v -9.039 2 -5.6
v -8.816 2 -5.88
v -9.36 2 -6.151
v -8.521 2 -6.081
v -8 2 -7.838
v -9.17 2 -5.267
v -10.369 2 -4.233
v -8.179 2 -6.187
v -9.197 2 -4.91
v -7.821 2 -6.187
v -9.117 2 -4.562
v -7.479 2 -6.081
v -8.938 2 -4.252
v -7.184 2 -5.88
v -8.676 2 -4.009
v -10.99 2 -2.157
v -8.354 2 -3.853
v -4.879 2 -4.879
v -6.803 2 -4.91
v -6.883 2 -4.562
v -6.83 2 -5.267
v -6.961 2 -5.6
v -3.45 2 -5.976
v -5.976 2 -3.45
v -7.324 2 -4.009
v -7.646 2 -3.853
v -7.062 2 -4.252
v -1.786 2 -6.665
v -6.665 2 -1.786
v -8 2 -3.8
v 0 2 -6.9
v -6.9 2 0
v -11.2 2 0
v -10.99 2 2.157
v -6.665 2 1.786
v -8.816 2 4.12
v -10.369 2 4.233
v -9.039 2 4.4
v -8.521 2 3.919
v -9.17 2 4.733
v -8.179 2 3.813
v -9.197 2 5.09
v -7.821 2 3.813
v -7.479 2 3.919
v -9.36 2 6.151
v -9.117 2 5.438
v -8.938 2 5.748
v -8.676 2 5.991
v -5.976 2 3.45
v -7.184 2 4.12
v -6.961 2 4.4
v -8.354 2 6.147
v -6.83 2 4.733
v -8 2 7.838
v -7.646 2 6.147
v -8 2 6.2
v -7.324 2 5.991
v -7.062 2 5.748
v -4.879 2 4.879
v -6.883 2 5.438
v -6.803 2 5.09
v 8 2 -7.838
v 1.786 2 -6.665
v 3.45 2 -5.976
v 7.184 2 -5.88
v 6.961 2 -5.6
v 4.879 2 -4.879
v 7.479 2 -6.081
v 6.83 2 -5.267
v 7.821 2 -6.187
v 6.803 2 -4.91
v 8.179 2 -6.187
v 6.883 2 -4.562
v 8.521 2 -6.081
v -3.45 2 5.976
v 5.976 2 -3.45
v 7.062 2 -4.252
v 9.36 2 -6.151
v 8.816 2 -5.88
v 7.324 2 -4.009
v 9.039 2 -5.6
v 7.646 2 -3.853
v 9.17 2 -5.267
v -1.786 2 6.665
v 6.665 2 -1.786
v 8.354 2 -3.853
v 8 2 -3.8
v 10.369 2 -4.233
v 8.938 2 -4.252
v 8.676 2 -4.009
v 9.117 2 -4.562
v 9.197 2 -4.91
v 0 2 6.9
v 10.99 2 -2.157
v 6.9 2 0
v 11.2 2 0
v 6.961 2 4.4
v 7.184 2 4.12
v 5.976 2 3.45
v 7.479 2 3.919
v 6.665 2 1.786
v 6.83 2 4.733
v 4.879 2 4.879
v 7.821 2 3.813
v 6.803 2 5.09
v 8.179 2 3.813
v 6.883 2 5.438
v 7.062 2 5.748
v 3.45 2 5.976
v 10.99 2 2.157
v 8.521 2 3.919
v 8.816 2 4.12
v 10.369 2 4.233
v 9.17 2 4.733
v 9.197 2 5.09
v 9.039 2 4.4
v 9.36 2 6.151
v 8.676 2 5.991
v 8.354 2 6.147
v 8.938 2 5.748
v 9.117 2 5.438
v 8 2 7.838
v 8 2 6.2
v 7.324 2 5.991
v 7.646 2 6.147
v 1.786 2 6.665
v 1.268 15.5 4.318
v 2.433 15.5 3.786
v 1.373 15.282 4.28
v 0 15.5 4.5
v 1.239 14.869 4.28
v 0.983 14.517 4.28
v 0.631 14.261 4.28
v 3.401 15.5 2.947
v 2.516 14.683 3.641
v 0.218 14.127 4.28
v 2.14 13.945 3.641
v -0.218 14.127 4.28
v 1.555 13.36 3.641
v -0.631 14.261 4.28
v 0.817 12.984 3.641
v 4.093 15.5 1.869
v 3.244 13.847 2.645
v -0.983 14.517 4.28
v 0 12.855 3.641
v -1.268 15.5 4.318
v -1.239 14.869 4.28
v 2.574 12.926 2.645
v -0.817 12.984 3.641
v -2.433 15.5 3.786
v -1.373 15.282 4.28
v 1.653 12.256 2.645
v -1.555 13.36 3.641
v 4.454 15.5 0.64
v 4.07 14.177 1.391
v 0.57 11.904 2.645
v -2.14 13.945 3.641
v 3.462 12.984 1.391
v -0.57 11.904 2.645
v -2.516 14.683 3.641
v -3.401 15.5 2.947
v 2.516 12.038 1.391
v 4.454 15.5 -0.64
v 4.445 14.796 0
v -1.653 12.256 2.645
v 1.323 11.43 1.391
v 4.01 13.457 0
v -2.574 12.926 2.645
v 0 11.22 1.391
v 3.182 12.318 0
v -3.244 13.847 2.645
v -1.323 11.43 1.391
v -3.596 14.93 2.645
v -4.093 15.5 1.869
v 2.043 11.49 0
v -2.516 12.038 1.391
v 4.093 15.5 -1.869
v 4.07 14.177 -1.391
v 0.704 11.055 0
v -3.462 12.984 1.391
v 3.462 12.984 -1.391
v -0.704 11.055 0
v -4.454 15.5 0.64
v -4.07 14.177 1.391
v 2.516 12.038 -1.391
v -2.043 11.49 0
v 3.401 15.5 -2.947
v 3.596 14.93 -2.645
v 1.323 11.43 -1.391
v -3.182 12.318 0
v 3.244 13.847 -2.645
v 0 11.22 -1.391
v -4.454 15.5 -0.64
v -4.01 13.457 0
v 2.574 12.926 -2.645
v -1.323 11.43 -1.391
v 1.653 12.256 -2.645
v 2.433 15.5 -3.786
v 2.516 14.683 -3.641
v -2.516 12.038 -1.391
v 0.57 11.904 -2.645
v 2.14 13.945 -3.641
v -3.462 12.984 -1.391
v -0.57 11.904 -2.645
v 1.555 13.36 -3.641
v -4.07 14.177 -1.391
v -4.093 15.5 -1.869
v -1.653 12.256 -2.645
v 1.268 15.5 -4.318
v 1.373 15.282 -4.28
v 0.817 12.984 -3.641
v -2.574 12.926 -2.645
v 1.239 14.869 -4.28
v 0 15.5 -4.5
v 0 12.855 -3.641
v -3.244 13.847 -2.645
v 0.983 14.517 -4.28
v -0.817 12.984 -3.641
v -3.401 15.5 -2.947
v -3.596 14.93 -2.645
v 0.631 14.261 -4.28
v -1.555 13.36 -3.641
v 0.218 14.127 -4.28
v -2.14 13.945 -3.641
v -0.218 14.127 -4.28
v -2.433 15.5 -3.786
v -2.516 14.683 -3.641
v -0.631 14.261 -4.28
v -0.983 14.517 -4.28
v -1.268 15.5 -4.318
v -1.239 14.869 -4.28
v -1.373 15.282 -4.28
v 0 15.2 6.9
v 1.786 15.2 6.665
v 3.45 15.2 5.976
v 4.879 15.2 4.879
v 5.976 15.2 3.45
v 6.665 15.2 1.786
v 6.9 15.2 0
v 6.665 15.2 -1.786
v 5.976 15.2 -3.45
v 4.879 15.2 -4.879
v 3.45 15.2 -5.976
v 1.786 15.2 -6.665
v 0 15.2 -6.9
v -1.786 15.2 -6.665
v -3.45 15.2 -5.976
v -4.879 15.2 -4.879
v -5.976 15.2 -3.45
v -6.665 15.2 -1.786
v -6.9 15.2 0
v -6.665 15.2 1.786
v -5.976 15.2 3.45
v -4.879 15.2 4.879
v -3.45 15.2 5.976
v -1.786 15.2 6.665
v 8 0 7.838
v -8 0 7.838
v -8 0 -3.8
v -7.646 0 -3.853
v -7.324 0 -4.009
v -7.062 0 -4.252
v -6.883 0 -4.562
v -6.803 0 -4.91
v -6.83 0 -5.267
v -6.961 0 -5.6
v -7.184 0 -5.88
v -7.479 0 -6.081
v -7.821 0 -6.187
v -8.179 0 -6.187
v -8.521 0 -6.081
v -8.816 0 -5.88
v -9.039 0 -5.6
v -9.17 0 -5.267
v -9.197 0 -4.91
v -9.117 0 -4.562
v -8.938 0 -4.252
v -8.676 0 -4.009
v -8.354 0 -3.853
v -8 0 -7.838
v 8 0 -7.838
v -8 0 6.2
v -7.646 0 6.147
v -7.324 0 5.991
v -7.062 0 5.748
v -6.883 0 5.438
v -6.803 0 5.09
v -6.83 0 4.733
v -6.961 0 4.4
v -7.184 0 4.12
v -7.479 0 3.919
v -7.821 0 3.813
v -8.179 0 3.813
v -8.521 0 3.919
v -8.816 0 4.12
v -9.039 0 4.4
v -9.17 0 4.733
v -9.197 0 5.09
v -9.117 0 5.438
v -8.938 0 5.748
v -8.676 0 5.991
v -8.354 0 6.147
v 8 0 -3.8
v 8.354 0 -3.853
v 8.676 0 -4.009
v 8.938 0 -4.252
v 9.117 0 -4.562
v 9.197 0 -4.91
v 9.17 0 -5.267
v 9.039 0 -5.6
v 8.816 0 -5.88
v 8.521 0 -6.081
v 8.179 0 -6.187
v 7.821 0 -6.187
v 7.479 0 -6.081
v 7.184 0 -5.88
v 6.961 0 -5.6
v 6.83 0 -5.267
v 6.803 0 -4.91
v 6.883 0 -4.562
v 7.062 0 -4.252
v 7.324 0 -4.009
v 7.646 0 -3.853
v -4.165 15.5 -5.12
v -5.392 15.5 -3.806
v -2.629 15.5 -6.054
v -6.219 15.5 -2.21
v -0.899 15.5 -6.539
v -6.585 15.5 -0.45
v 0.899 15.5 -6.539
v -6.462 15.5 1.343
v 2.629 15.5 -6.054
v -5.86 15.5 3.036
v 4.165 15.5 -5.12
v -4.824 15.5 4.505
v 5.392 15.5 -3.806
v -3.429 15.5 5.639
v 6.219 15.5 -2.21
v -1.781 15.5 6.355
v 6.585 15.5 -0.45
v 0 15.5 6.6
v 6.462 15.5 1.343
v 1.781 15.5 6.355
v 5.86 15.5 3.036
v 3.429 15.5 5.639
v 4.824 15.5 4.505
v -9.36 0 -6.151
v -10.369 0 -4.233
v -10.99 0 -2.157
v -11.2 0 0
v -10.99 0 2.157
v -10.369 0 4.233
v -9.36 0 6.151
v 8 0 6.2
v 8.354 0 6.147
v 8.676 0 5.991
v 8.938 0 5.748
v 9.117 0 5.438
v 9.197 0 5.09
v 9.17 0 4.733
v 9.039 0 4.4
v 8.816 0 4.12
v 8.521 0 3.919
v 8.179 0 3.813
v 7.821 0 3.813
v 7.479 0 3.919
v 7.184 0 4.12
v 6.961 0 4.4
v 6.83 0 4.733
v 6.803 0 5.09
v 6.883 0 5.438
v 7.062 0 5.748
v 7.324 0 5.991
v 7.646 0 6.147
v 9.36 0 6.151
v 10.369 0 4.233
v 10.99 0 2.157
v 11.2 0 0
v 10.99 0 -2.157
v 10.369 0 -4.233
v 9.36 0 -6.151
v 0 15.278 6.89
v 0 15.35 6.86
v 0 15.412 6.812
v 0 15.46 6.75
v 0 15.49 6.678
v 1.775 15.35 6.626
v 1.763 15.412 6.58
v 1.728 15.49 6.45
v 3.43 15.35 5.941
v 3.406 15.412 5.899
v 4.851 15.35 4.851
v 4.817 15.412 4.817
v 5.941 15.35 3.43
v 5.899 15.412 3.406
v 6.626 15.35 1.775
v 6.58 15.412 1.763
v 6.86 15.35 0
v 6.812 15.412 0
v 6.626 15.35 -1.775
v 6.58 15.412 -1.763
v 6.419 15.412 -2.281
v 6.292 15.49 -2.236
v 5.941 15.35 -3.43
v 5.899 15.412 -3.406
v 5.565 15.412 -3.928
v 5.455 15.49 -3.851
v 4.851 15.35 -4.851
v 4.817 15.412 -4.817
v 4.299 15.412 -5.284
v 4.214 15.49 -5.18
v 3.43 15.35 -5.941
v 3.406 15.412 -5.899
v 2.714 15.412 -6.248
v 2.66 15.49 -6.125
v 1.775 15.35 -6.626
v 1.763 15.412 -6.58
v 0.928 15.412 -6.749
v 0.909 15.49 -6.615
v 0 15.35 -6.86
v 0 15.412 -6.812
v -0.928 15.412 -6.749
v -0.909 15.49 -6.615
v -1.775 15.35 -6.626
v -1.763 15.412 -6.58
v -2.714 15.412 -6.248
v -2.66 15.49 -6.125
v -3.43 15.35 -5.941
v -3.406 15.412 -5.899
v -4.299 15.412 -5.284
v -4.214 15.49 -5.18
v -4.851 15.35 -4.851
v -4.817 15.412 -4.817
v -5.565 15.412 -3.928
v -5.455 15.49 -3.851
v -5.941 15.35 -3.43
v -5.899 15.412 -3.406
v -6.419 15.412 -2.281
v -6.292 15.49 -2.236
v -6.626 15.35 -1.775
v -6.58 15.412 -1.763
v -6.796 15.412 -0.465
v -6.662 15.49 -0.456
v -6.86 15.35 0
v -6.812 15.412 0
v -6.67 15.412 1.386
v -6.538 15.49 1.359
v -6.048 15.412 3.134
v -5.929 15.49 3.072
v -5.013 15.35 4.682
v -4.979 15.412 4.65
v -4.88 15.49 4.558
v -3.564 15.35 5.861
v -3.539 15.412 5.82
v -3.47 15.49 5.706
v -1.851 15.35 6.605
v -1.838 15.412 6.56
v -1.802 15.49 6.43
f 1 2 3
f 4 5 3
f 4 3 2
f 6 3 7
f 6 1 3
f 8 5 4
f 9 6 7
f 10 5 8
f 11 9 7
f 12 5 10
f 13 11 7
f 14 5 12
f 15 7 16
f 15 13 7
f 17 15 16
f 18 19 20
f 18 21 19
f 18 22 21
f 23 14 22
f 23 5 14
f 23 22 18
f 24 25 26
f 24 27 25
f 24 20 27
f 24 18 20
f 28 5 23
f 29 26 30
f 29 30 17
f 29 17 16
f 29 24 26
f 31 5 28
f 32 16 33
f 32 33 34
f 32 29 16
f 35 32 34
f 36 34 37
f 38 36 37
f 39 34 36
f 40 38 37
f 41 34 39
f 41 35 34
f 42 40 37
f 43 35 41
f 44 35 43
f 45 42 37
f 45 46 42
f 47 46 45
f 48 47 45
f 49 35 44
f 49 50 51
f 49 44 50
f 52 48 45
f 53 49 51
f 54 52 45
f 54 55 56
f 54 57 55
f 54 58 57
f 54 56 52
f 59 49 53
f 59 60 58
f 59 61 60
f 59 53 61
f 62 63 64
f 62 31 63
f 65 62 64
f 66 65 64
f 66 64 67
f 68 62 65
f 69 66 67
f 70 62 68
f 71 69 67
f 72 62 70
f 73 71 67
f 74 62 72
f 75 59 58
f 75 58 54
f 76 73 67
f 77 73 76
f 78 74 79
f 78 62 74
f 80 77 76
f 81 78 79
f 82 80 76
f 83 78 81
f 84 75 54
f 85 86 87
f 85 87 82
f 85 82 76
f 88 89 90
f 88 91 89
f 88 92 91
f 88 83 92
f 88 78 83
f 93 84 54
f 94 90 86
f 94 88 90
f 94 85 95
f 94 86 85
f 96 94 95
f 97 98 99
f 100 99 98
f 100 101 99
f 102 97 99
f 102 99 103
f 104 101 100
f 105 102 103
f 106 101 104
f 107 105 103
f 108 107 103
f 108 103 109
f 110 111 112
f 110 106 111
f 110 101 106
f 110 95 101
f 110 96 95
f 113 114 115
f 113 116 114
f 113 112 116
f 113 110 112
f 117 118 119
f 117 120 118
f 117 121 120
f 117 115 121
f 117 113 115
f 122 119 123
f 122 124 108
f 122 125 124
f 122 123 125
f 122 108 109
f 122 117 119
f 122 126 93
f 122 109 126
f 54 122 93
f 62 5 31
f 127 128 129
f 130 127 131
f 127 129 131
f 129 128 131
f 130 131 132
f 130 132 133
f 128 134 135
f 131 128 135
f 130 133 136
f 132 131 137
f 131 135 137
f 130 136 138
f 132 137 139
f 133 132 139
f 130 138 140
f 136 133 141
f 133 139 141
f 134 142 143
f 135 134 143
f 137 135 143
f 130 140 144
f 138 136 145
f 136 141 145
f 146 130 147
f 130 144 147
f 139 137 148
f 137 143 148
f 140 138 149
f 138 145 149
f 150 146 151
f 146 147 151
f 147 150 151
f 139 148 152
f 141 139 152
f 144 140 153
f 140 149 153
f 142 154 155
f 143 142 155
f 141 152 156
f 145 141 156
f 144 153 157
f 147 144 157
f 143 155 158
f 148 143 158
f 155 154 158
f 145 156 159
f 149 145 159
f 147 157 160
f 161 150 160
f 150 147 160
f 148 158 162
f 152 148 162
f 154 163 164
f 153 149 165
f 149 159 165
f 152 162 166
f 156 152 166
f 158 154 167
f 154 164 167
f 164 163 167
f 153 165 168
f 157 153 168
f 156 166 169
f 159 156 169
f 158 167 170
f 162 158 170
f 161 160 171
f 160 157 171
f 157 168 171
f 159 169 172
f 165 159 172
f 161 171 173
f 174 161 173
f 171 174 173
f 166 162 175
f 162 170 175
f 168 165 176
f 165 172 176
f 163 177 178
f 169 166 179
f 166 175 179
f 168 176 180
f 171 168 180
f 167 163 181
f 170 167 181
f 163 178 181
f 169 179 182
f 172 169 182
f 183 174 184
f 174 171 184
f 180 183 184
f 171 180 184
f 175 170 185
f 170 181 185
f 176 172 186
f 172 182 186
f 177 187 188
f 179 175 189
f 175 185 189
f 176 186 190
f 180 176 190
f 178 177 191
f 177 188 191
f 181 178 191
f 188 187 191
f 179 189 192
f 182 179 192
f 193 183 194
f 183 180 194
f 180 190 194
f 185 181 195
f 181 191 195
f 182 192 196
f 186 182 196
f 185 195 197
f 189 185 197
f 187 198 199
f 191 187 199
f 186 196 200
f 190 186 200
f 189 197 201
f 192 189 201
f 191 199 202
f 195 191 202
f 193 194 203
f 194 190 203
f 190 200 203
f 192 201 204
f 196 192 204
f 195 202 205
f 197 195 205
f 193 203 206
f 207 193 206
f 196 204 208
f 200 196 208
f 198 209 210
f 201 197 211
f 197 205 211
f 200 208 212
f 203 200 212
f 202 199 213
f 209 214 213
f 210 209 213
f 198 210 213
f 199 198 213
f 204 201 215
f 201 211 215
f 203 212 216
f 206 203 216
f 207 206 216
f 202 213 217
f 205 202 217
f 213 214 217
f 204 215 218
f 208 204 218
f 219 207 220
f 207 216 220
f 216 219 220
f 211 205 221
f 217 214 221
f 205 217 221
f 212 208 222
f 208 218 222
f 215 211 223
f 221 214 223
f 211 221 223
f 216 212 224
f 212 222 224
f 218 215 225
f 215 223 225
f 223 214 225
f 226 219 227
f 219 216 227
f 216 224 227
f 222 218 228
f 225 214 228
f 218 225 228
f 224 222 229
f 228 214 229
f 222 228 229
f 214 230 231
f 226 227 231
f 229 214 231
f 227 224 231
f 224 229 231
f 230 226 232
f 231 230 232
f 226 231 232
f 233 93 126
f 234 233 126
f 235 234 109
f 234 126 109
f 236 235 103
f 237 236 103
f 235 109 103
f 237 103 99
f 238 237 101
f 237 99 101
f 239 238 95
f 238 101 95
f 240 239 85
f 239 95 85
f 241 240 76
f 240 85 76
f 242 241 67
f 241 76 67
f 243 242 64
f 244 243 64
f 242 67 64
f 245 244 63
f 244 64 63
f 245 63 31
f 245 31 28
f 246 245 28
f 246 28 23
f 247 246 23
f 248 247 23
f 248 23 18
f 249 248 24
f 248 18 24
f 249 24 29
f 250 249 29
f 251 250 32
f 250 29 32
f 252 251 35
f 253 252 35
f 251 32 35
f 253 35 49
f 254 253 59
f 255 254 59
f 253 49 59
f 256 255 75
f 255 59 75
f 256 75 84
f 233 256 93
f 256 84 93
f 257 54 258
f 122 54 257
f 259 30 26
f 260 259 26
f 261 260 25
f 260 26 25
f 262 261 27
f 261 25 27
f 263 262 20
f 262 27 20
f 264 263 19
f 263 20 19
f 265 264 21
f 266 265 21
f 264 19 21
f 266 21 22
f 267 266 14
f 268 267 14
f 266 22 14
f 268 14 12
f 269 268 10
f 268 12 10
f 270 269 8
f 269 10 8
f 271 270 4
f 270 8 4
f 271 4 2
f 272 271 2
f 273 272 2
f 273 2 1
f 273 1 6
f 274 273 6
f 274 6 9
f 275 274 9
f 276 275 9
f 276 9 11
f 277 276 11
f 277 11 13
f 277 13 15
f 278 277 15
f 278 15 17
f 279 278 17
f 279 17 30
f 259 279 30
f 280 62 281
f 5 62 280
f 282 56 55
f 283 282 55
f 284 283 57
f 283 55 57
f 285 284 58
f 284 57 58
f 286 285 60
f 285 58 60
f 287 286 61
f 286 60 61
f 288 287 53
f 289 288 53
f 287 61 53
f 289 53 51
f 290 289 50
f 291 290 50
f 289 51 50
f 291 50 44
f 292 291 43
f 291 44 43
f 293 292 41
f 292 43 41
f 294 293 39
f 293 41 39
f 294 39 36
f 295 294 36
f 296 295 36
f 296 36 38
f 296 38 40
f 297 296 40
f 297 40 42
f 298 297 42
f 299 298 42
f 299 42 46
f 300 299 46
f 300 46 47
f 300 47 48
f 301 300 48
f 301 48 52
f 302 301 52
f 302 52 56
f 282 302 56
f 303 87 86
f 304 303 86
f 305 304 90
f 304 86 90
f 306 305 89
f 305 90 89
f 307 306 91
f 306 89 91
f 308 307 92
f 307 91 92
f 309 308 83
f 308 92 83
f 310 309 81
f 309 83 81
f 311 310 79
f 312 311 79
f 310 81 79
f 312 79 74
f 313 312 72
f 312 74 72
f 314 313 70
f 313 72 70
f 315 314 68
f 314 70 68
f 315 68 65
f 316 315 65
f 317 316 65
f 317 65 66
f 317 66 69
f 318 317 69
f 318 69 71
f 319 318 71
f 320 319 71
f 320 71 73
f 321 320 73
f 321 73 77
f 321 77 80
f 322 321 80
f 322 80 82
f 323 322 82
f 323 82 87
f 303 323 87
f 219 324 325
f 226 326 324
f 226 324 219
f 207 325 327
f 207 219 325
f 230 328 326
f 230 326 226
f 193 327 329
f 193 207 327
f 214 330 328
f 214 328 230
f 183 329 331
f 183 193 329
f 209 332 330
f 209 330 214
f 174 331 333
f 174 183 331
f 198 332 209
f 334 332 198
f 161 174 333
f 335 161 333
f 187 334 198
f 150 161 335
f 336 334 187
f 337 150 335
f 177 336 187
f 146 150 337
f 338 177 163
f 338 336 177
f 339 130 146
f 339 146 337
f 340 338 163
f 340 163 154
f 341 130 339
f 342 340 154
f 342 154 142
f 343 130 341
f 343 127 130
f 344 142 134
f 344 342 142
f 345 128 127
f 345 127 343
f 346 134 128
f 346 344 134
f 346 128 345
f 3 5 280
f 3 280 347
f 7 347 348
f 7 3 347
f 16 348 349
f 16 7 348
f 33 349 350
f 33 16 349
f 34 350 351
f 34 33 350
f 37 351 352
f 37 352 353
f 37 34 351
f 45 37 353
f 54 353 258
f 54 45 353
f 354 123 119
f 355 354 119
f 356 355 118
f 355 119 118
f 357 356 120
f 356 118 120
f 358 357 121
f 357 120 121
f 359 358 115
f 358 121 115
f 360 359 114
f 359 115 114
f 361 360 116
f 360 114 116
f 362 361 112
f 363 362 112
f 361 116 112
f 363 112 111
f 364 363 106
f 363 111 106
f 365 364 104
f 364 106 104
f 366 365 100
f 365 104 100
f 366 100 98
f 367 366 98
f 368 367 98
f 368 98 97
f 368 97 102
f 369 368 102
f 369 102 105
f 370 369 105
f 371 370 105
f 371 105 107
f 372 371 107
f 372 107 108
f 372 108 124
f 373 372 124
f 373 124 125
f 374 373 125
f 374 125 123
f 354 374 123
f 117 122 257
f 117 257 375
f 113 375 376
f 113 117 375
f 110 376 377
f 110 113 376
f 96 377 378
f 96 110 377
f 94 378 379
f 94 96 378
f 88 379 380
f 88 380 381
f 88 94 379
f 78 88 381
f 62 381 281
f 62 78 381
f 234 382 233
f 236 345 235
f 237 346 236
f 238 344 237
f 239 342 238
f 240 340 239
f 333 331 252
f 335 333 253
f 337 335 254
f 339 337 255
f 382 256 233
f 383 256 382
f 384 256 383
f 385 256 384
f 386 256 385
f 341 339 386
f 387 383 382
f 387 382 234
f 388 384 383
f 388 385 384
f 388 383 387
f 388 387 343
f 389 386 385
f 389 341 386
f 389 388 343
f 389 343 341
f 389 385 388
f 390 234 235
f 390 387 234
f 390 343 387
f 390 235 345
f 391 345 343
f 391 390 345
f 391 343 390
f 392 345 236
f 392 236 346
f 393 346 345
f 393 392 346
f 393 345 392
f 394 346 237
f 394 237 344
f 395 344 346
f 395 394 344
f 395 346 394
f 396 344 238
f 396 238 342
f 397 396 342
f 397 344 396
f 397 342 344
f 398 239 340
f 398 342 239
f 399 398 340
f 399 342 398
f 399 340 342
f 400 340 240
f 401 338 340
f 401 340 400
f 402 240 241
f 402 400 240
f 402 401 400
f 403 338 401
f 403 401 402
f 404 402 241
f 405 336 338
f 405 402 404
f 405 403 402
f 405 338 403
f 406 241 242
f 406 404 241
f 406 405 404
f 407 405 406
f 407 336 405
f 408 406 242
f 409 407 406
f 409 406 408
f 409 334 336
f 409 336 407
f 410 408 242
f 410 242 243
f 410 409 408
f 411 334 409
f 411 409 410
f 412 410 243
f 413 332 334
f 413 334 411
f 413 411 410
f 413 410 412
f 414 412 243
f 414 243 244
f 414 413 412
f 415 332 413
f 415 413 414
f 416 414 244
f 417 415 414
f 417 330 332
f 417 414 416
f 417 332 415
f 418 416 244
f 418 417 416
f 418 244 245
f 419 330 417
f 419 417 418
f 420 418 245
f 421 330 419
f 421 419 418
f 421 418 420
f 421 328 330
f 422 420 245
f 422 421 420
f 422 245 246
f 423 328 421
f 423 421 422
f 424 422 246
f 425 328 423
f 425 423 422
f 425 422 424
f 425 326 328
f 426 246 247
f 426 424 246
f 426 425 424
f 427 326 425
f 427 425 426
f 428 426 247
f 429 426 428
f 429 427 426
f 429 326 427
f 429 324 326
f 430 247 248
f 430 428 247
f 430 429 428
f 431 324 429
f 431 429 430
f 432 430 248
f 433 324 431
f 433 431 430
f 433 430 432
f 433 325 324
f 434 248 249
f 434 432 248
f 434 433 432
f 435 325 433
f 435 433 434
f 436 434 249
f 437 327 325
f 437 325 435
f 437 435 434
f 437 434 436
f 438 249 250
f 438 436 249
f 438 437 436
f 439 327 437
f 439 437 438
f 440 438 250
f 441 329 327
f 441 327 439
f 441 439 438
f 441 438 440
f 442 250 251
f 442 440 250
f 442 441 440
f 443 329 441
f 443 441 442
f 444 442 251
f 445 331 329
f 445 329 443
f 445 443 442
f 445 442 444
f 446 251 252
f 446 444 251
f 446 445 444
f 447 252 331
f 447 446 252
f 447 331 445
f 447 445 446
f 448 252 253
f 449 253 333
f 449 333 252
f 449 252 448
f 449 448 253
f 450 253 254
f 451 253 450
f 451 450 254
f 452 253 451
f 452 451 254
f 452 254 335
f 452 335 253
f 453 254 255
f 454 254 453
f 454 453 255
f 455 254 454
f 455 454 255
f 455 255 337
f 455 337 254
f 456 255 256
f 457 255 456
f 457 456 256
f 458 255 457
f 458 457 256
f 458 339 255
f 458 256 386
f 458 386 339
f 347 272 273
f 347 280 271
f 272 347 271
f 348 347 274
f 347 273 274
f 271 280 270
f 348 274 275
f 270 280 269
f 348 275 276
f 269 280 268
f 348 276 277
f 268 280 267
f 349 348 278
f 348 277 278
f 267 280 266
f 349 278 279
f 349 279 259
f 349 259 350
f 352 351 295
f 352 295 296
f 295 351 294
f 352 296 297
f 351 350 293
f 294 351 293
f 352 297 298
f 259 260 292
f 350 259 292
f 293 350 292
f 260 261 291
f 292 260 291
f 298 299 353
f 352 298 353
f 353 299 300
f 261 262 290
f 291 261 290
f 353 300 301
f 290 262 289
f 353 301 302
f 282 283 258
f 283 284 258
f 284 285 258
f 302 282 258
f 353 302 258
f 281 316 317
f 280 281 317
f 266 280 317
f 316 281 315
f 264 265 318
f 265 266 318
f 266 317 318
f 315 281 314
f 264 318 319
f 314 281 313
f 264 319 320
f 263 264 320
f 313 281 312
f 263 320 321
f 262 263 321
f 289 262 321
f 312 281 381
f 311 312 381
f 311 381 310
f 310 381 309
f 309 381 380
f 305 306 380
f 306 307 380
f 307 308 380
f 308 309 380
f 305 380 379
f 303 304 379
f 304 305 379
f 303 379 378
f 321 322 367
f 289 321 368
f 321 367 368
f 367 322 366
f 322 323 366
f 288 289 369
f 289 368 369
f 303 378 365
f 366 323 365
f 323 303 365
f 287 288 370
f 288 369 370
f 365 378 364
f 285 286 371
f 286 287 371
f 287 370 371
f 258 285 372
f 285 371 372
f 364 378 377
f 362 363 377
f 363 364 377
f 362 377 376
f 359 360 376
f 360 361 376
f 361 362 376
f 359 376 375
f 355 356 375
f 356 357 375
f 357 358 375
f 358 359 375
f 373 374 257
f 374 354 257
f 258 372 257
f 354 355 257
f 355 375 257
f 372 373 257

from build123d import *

# Parameters (mm, degrees)
SKETCH_1_R          = 11.2
EXTRUDE_1_DEPTH     = 2
SKETCH_2_OUTSIDE_W  = 30.748
SKETCH_2_OUTSIDE_H  = 30.748
CUT_EXTRUDE_1_DEPTH = 2
SKETCH_3_R          = 6.9
EXTRUDE_2_DEPTH     = 13.5
SKETCH_4_R          = 1.2
CUT_EXTRUDE_2_DEPTH = 13.5
FILLET_1_R          = 0.3


with BuildPart() as part:
    # 草图1 → 凸台-拉伸1 (new body)
    with BuildSketch(Plane(origin=(0, 0, 0), x_dir=(1, 0, 0), z_dir=(0, 1, 0))):
        with Locations(Location((0, 0, 0), (0, 0, 270))):
            Circle(SKETCH_1_R)
    extrude(amount=EXTRUDE_1_DEPTH)

    # 草图2 outside → 切除-拉伸1 (cut)
    with BuildSketch(Plane(origin=(0, 2, 0), x_dir=(1, 0, 0), z_dir=(0, 1, 0))):
        Rectangle(SKETCH_2_OUTSIDE_W, SKETCH_2_OUTSIDE_H)
        with BuildLine():
            Line((-8, -7.838367177), (8, -7.838367177))
            ThreePointArc((8, -7.838367177), (11.2, 0), (8, 7.838367177))
            Line((8, 7.838367177), (-8, 7.838367177))
            ThreePointArc((-8, 7.838367177), (-11.2, 0), (-8, -7.838367177))
        make_face(mode=Mode.SUBTRACT)
    extrude(amount=-CUT_EXTRUDE_1_DEPTH, mode=Mode.SUBTRACT)

    # 草图3 → 凸台-拉伸2 (add)
    with BuildSketch(Plane(origin=(0, 2, 0), x_dir=(1, 0, 0), z_dir=(0, 1, 0))):
        with Locations(Location((0, 0, 0), (0, 0, 270))):
            Circle(SKETCH_3_R)
    extrude(amount=EXTRUDE_2_DEPTH)

    # 草图4 → 切除-拉伸2 (cut)
    with BuildSketch(Plane(origin=(0, 2, 0), x_dir=(1, 0, 0), z_dir=(0, 1, 0))):
        with Locations(Location((-8, 5, 0), (0, 0, 270))):
            Circle(SKETCH_4_R)
        with Locations(Location((-8, -5, 0), (0, 0, 270))):
            Circle(SKETCH_4_R)
        with Locations(Location((8, -5, 0), (0, 0, 270))):
            Circle(SKETCH_4_R)
        with Locations(Location((8, 5, 0), (0, 0, 270))):
            Circle(SKETCH_4_R)
    extrude(amount=-CUT_EXTRUDE_2_DEPTH, mode=Mode.SUBTRACT)

    # 圆角1
    fillet_1_edges = [part.edges().sort_by_distance(p)[0] for p in [
        (0, 15.5, -6.9),
    ]]
    fillet(fillet_1_edges, radius=FILLET_1_R)

    # 草图5 → 切除-旋转1 (revolve, cut)
    with BuildSketch(Plane(origin=(0, 15.5, 0), x_dir=(1, 0, 0), z_dir=(0, 1, 0))):
        with BuildLine():
            Line((0, 4.5), (0, -4.5))
            ThreePointArc((0, -4.5), (4.5, 0), (0, 4.5))
        make_face()
    revolve(axis=Axis((0, 15.5, 4.5), (0, 0, -1)), mode=Mode.SUBTRACT)


solid = part.part
